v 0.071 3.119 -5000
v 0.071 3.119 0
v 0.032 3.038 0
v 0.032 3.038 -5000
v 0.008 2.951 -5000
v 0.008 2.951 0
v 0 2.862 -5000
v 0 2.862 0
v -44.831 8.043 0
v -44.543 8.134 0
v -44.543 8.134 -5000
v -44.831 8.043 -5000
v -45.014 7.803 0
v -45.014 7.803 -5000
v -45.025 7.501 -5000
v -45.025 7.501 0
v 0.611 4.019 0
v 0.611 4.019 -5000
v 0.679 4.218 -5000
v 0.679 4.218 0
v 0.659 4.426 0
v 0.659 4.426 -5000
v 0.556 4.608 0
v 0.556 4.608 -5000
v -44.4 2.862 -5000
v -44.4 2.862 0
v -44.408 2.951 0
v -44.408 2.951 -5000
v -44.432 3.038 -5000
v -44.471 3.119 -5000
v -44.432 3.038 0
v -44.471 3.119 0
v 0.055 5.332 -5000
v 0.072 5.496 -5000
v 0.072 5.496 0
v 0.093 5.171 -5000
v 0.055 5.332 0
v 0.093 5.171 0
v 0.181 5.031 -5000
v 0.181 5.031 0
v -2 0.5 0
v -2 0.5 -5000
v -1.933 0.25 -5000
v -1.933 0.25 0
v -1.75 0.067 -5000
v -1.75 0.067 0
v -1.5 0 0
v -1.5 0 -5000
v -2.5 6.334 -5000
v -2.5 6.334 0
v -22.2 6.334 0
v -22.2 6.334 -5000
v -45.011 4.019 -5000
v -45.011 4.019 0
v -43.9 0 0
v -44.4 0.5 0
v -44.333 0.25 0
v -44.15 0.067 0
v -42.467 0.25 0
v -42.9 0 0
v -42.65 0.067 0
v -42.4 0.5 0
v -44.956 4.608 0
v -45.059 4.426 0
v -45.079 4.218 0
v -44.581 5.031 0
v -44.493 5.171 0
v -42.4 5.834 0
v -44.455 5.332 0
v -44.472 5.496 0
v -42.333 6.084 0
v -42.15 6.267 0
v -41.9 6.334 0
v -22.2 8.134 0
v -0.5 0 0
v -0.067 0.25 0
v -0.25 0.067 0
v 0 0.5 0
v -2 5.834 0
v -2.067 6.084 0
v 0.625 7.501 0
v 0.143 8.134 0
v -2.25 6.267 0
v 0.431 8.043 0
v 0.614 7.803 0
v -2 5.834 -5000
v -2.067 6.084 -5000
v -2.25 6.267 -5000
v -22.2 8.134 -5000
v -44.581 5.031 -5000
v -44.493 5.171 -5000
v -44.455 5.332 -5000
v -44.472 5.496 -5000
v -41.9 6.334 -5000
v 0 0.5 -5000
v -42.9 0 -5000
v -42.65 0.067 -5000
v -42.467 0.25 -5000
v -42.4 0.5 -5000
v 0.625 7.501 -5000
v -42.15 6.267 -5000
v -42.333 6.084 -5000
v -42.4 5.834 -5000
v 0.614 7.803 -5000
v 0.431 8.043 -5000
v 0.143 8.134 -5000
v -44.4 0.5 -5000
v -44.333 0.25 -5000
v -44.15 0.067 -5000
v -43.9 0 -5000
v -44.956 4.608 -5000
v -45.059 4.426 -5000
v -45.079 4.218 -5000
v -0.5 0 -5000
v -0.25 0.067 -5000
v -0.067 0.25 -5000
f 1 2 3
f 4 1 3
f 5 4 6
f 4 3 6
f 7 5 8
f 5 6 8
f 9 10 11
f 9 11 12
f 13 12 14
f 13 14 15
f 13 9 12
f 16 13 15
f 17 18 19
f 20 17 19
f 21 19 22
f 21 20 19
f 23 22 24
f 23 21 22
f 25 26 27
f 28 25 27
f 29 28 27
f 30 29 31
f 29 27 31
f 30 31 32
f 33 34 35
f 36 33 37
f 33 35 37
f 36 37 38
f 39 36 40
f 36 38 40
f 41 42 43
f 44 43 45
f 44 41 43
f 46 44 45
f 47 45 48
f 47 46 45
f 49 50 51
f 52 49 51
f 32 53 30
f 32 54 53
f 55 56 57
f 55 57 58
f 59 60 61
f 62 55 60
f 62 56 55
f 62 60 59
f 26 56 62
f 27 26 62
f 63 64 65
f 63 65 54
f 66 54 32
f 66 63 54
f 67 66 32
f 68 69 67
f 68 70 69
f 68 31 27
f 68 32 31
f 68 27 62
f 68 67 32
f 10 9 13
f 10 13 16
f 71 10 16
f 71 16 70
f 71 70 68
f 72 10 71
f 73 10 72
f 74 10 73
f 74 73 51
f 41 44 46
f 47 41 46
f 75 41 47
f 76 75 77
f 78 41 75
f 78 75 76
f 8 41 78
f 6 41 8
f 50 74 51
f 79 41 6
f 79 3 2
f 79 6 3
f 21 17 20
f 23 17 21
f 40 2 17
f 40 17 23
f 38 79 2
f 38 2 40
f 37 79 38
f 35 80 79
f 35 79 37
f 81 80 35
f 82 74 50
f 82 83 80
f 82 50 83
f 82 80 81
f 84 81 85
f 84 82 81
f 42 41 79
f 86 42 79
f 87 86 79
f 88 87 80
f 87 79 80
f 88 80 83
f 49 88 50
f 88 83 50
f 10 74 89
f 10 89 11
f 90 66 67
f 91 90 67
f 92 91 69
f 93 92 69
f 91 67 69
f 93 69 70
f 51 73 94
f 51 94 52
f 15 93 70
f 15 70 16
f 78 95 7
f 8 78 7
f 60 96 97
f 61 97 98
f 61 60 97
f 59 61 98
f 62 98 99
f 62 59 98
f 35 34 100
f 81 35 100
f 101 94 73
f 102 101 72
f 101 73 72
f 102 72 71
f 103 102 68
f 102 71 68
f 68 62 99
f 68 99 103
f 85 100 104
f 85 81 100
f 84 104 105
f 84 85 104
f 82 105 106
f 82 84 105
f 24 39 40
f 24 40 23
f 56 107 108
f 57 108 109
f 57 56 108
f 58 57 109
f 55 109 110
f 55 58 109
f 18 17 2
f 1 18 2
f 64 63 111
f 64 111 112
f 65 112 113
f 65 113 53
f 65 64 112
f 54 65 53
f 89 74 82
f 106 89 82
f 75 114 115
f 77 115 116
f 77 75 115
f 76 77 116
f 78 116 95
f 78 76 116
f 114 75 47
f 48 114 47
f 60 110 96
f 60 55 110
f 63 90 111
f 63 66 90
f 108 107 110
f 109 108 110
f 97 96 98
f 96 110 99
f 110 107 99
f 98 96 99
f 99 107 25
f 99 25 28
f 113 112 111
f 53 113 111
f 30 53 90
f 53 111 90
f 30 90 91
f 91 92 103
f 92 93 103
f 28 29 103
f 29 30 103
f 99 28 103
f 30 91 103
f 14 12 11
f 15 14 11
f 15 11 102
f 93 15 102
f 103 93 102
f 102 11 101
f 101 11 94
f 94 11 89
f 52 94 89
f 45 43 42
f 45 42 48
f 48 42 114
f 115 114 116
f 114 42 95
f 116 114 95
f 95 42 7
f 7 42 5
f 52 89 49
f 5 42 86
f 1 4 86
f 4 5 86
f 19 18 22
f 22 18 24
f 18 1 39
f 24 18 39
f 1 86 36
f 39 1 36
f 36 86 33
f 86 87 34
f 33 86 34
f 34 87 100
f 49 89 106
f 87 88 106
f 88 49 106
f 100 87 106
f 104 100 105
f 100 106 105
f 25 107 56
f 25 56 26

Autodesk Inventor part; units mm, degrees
ref_plane "YZ Plane" through (0, 0, 0) normal (1, 0, 0) x (0, 1, 0)
ref_plane "XZ Plane" through (0, 0, 0) normal (0, 1, 0) x (-1, 0, 0)
ref_plane "XY Plane" through (0, 0, 0) normal (0, 0, 1) x (1, 0, 0)
sketch "Sketch1" plane through (0, 0, 0) normal (0, 0, 1) x (1, 0, 0)
  line L0 (-22.2, 8.1341) -> (0.1434, 8.1341)
  line L1 (-0.5, 0) -> (-1.5, 0)
  line L2 (-2, 0.5) -> (-2, 5.8341)
  line L3 (-2.5, 6.3341) -> (-22.2, 6.3341)
  line L4 (0.1806, 5.0309) -> (0.5561, 4.6085)
  line L5 (0.0723, 5.4961) -> (0.6254, 7.5011)
  line L6 (0.6112, 4.0192) -> (0.0712, 3.1187)
  line L7 (0, 0.5) -> (0, 2.8616)
  line L8 (-22.2, 15.4691) -> (-22.2, -2.8641) construction
  arc A0 (-2, 5.8341) -> (-2.5, 6.3341) centre (-2.5, 5.8341) ccw
  arc A1 (0.6254, 7.5011) -> (0.1434, 8.1341) centre (0.1434, 7.6341) ccw
  arc A2 (0.0723, 5.4961) -> (0.1806, 5.0309) centre (0.5543, 5.3631) ccw
  arc A3 (0.6112, 4.0192) -> (0.5561, 4.6085) centre (0.1824, 4.2763) ccw
  arc A4 (0.0712, 3.1187) -> (0, 2.8616) centre (0.5, 2.8616) ccw
  arc A5 (-0.5, 0) -> (0, 0.5) centre (-0.5, 0.5) ccw
  arc A6 (-2, 0.5) -> (-1.5, 0) centre (-1.5, 0.5) ccw
  line L9 (-22.2, 8.1341) -> (-44.5434, 8.1341)
  line L10 (-43.9, 0) -> (-42.9, 0)
  line L11 (-42.4, 0.5) -> (-42.4, 5.8341)
  line L12 (-41.9, 6.3341) -> (-22.2, 6.3341)
  line L13 (-44.5806, 5.0309) -> (-44.9561, 4.6085)
  line L14 (-44.4723, 5.4961) -> (-45.0254, 7.5011)
  line L15 (-45.0112, 4.0192) -> (-44.4712, 3.1187)
  line L16 (-44.4, 0.5) -> (-44.4, 2.8616)
  arc A7 (-41.9, 6.3341) -> (-42.4, 5.8341) centre (-41.9, 5.8341) ccw
  arc A8 (-44.5434, 8.1341) -> (-45.0254, 7.5011) centre (-44.5434, 7.6341) ccw
  arc A9 (-44.5806, 5.0309) -> (-44.4723, 5.4961) centre (-44.9543, 5.3631) ccw
  arc A10 (-44.9561, 4.6085) -> (-45.0112, 4.0192) centre (-44.5824, 4.2763) ccw
  arc A11 (-44.4, 2.8616) -> (-44.4712, 3.1187) centre (-44.9, 2.8616) ccw
  arc A12 (-44.4, 0.5) -> (-43.9, 0) centre (-43.9, 0.5) ccw
  arc A13 (-42.9, 0) -> (-42.4, 0.5) centre (-42.9, 0.5) ccw
  point P0 (0, 0)
  point P1 (0, 0)
  point P2 (0, 5.2341)
  point P3 (0.8, 8.1341)
  point P4 (0, 3)
  point P5 (0.8, 4.3341)
  point P6 (-44.4, 0)
  point P7 (-44.4, 0)
  point P8 (-44.4, 5.2341)
  point P9 (-45.2, 8.1341)
  point P10 (-44.4, 3)
  point P11 (-45.2, 4.3341)
  dimension "d7" = 0.8
  dimension "d8" = 0.8
  dimension "d9" = 3.8
  dimension "d10" = 2.9
  dimension "d12" = 3
  dimension "d13" = 8.1341
  dimension "d14" = 2.2341
  dimension "d15" = 1.8
  dimension "d16" = 2
  dimension "d18" = 0.5
  dimension "d19" = 46
extrude "Extrusion1" add sketch "Sketch1" against normal blind 5000
properties part number "HD - 404 PERFIL DE ALUMINIO - CLIP DE TRAVESAÑO HORIZONTAL"
